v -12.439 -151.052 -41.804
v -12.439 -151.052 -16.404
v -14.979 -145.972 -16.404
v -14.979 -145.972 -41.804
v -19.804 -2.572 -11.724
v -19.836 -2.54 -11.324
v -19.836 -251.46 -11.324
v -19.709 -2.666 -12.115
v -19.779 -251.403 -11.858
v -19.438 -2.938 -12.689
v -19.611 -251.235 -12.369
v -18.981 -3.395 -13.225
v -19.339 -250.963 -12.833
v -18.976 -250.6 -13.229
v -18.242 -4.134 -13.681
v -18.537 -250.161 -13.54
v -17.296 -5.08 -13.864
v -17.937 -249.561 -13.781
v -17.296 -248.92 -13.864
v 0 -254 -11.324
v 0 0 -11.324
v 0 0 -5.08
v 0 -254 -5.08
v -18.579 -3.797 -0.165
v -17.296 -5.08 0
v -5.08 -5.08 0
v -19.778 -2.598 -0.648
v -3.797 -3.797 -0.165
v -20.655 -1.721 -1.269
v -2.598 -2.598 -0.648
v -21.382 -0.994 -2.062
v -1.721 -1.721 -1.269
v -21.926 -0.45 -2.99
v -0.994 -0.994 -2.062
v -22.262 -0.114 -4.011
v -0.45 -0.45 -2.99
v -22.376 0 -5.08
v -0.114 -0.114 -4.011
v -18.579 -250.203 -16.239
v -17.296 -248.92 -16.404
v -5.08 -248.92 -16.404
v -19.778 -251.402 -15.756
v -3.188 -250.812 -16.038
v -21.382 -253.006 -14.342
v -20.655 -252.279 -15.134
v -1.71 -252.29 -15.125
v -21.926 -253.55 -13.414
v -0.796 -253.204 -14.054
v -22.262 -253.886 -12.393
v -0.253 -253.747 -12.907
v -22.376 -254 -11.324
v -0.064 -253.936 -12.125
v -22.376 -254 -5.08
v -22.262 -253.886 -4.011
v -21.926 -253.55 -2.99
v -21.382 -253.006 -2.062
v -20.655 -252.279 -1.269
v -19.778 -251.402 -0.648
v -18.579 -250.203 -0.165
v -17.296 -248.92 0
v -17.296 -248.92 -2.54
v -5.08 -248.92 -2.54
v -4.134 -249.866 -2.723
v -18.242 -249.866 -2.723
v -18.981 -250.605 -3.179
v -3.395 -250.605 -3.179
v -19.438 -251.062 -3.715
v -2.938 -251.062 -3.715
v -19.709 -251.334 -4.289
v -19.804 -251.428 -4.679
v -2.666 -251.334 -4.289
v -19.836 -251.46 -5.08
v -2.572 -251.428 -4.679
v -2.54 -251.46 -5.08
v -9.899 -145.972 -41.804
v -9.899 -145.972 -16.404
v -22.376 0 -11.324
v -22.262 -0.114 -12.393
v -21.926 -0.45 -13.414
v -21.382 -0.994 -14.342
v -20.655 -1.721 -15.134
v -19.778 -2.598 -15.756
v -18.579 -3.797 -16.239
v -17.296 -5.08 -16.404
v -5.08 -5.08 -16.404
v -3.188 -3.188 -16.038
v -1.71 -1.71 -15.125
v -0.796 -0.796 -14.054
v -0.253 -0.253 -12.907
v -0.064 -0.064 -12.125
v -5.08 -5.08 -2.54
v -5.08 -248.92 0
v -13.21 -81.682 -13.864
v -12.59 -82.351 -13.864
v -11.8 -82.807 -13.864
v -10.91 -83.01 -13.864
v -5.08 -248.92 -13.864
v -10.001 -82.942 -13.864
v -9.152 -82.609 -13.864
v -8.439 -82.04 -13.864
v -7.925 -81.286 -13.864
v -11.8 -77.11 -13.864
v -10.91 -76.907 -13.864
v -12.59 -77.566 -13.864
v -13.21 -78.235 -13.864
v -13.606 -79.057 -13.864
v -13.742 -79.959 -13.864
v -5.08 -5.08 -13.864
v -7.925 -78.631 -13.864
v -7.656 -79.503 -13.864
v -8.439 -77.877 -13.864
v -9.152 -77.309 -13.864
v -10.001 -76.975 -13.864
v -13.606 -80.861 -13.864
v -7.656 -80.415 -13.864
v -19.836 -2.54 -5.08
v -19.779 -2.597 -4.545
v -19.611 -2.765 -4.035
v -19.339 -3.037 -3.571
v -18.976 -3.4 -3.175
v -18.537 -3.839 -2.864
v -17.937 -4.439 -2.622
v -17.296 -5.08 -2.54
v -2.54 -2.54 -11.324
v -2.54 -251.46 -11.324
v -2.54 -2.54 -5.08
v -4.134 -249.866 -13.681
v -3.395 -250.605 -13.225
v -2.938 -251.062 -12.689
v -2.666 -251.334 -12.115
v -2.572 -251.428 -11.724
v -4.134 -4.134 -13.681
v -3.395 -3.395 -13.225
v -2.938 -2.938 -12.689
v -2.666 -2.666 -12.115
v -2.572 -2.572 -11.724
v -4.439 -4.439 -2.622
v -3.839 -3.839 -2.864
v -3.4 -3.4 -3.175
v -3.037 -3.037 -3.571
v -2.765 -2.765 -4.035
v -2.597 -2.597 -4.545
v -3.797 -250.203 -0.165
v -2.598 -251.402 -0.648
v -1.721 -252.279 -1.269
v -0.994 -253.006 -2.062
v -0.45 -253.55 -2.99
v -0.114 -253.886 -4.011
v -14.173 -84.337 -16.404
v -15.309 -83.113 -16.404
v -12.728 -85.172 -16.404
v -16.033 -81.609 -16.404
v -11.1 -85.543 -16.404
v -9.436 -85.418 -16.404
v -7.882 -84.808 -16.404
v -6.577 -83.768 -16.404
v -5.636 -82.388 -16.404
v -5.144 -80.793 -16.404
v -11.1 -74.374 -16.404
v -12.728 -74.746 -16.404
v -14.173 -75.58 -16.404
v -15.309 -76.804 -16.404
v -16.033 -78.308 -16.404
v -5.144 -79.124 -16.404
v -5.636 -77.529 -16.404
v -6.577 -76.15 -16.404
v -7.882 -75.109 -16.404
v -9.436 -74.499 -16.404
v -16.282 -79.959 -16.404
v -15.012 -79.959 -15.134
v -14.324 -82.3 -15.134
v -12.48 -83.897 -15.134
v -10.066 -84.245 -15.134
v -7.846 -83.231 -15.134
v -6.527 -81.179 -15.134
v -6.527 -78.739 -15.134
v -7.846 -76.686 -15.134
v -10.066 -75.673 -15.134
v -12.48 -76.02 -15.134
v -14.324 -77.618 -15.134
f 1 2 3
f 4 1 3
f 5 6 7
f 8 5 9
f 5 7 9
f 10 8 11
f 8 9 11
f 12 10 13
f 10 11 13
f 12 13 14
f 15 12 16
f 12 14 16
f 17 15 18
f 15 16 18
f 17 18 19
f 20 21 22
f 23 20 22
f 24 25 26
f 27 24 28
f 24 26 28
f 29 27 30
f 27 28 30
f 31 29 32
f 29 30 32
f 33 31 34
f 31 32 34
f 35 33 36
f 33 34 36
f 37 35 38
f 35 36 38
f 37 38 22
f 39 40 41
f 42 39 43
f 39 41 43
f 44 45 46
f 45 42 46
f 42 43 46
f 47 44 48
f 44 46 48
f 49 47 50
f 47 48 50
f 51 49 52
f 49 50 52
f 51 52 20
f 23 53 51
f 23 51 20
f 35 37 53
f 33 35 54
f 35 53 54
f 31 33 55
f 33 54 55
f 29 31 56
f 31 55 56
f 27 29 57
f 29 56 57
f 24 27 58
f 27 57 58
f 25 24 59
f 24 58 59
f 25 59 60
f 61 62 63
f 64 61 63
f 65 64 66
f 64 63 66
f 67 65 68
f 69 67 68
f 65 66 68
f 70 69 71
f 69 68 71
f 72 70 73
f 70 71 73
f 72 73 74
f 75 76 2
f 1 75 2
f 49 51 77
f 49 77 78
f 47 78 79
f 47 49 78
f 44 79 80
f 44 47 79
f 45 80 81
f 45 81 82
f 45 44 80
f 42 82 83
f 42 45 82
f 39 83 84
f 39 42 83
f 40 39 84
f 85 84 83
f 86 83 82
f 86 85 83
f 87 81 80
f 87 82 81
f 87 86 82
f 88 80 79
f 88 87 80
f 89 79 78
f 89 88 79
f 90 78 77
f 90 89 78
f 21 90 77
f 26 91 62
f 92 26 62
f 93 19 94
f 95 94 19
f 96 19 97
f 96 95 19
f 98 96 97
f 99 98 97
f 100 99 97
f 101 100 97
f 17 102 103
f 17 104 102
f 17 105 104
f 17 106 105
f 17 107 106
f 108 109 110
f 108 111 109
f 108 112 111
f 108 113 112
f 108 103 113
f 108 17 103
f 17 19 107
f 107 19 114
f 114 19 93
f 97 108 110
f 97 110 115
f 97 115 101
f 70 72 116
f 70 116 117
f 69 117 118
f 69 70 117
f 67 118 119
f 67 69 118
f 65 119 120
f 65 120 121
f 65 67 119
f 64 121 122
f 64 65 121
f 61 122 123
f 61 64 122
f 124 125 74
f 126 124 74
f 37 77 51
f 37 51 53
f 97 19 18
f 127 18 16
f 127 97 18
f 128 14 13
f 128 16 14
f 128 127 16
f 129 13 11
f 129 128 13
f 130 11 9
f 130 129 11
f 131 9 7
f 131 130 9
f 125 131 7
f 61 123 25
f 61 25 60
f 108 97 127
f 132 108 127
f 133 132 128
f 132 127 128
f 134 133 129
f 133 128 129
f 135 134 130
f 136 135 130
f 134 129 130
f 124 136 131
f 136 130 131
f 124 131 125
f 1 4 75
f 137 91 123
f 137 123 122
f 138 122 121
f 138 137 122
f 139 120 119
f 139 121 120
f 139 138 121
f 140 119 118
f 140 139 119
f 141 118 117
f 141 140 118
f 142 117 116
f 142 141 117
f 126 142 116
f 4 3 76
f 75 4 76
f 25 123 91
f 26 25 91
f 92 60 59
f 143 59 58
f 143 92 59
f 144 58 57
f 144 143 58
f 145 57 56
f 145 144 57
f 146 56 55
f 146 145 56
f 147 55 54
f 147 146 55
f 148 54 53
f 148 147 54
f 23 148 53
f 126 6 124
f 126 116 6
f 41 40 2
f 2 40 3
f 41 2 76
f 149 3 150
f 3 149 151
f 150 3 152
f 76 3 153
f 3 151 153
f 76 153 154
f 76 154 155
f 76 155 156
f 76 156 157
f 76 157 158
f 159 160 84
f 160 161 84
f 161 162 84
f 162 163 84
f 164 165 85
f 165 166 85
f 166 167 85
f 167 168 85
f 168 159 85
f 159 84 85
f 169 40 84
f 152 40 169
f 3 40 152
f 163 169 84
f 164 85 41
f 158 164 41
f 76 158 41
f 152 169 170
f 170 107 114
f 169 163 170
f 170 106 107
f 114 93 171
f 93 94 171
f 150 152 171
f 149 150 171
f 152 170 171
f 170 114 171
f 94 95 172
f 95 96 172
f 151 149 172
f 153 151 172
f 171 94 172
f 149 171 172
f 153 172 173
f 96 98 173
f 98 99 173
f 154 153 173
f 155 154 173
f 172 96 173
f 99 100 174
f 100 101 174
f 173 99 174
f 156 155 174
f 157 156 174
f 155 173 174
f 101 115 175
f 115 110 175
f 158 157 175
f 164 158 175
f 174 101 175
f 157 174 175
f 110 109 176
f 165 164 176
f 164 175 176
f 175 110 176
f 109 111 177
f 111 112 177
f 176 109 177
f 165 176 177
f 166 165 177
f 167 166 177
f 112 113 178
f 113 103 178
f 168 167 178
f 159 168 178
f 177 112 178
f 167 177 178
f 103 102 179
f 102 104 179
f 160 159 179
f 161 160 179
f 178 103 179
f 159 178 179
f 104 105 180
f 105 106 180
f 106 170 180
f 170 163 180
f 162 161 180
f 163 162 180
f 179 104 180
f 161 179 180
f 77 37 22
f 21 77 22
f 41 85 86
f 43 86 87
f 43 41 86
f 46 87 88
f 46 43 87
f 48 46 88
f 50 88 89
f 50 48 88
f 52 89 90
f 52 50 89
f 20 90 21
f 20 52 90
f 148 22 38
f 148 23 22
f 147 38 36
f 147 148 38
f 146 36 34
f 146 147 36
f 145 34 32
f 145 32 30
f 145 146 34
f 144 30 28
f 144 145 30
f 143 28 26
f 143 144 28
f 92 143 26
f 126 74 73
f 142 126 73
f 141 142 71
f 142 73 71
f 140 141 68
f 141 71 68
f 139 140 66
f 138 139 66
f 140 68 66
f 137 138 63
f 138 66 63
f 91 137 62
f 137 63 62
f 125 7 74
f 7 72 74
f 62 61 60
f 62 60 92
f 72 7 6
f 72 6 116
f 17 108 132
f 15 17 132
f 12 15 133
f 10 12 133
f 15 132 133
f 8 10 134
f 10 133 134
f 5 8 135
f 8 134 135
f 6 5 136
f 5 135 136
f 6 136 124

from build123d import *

# Parameters (mm, degrees)
F0_W           = 22.3758686334
F0_H           = 16.4037477225
F1_DEPTH       = 254
F2_R           = 5.08
F3_T           = -2.54
F5_DEPTH       = 25.4
F7_D           = 5.5
F7_CSINK_D     = 11.2
F7_CSINK_ANGLE = 90


# Not quite as in the source:
# - a shell that OpenCascade refuses in one call is made with other operations: the cavity is built on its own and cut out


with BuildPart() as f1:
    # F0 (on Front) → F1 (new body)
    with BuildSketch(Plane.XZ):
        with Locations((-11.1879343167, -8.2018738613)):
            Rectangle(F0_W, F0_H)
    extrude(amount=F1_DEPTH)

    # F2
    f2_edges = [f1.edges().sort_by_distance(p)[0] for p in [
        (0, -127, 0),
        (-22.375869, -127, 0),
        (-11.187934, 0, 0),
        (-11.187934, -254, 0),
        (-22.375869, -127, -16.403748),
        (0, -127, -16.403748),
        (-11.187934, 0, -16.403748),
        (-11.187934, -254, -16.403748),
    ]]
    fillet(f2_edges, radius=F2_R)

    # F3: a shell. OpenCascade refuses it in one call, so the cavity is built on its own and cut out:
    # the body offset inwards by the wall thickness, plus a prism from it out through each open face.
    f3_core = offset(f1.part, amount=F3_T, mode=Mode.PRIVATE)
    f3_exits = [f3_core.faces().sort_by_distance(p)[0] for p in [
        (-11.187934, -127, -2.54),
    ]]
    add(f3_core, mode=Mode.SUBTRACT)
    extrude(f3_exits, amount=-F3_T, mode=Mode.SUBTRACT)

    # F4 (on face) → F5 (join)
    with BuildSketch(Plane(origin=(0, 0, -16.4037477225), x_dir=(1, 0, 0), z_dir=(0, 0, -1))):
        Polygon((-14.9793126683, 145.9724638483), (-12.4393126683, 145.9724638483), (-9.8993126683, 145.9724638483), (-12.4393126683, 151.0524716356), align=None)
    extrude(amount=F5_DEPTH)

    # F7 (through all)
    with Locations(Plane(origin=(0, 0, -16.4037477225), x_dir=(1, 0, 0), z_dir=(0, 0, -1))):
        with Locations((-10.6817428023, 79.9587219954)):
            CounterSinkHole(F7_D / 2, F7_CSINK_D / 2, counter_sink_angle=F7_CSINK_ANGLE)


solid = f1.part
